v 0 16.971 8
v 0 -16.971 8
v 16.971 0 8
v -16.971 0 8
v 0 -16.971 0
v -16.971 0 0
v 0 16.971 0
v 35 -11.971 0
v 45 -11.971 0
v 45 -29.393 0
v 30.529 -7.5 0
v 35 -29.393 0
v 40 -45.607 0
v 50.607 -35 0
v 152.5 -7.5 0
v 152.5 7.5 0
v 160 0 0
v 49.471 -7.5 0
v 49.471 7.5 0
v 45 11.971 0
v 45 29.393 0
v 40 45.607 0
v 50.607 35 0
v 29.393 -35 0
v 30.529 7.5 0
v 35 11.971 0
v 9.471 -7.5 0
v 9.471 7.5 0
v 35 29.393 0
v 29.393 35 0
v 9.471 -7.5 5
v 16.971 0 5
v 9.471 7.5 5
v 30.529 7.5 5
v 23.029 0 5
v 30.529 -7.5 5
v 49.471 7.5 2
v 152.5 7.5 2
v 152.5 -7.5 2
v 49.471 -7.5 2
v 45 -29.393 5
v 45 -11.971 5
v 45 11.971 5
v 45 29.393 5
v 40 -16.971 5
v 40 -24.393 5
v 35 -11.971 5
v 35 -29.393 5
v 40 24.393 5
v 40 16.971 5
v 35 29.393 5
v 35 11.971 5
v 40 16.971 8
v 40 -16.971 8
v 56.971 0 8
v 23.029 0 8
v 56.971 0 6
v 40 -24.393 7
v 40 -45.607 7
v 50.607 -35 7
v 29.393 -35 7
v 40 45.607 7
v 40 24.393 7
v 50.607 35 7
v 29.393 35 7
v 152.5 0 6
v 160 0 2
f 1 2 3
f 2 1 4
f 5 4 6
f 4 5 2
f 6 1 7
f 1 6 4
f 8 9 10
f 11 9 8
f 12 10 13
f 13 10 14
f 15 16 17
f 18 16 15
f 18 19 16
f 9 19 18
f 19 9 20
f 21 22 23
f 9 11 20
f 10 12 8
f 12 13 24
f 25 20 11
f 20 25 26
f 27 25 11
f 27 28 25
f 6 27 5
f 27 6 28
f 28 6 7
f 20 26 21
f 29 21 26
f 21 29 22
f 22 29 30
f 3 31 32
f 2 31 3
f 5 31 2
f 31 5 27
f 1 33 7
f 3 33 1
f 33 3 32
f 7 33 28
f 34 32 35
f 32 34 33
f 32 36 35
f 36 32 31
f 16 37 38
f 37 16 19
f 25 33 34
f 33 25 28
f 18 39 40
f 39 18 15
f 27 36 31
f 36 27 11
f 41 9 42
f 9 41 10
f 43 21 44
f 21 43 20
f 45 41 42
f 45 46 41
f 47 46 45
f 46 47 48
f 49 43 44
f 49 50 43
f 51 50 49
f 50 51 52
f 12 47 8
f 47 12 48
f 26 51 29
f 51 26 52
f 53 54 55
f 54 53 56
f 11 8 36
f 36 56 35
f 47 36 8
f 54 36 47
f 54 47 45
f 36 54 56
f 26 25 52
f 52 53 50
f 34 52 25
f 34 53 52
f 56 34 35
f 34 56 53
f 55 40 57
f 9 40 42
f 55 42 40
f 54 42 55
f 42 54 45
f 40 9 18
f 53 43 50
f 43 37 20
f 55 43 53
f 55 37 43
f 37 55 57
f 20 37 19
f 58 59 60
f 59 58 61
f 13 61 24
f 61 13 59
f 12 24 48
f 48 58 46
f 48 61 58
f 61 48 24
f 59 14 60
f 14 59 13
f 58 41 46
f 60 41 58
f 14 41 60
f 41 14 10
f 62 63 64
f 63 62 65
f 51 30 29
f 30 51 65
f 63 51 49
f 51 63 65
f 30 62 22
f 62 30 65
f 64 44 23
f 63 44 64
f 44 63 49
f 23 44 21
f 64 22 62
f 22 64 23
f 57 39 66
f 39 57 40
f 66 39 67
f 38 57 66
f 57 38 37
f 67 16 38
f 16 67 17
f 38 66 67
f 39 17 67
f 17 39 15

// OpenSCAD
large_decoration_height = 8; //[0:30]
small_decoration_height = 7; //[0:30]
large_decoration_width = 24; //[10:40]
small_decoration_width = 15; //[7:35]
handle_width = 15; //[5:25]
hilt_width = 10; //[5:25]
hilt_length = 70; //[30:130]
handle_height = 5; //[0:30]
blade_length = 120; //[20:250]
blade_side_height = 2; //[0:30]
blade_center_height = 6; //[0:30]

// preview[view:south west, tilt:top diagonal]

//bottom
	rotate([0,0,45])
	translate([-large_decoration_width/2,-large_decoration_width/2,0])
	cube(size=[large_decoration_width,large_decoration_width,large_decoration_height]);

//handle
translate([0,-handle_width/2,0])
cube(size = [40,handle_width,handle_height]);

//hilt
translate([40 - hilt_width/2,-hilt_length/2,0])
cube(size = [hilt_width,hilt_length,handle_height]);

//where the two parts of the handle intersect
translate([40,0,0])
	rotate([0,0,45])
	translate([-large_decoration_width/2,-large_decoration_width/2,0])
	cube(size=[large_decoration_width,large_decoration_width,large_decoration_height]);

//right of hilt
translate([40,-hilt_length/2,0])
	rotate([0,0,45])
	translate([-small_decoration_width/2,-small_decoration_width/2,0])
	cube(size=[small_decoration_width,small_decoration_width,small_decoration_height]);

//left of hilt
translate([40,hilt_length/2,0])
	rotate([0,0,45])
	translate([-small_decoration_width/2,-small_decoration_width/2,0])
	cube(size=[small_decoration_width,small_decoration_width,small_decoration_height]);

//blade
translate([40,0,0])
polyhedron(
	points=[
			//bottom
			[0,-7.5,0], //0
			[blade_length-7.5,-7.5,0], //1
			[blade_length-7.5,7.5,0], //2
			[0,7.5,0], //3
			[blade_length,0,0], //4
			//middle
			[0,-7.5,blade_side_height], //5
			[blade_length-7.5,-7.5,blade_side_height], //6
			[blade_length-7.5,7.5,blade_side_height], //7
			[0,7.5,blade_side_height], //8
			[blade_length,0,blade_side_height], //9
			//top
			[0,0,blade_center_height], //10
			[blade_length-7.5,0,blade_center_height] //11
			],
	triangles=[
			//~-~bottom~-~
			[0,1,2],
			[0,2,3],
			//bottom point
			[1,4,2],
			//~-~walls~-~
			//right
			[0,5,1],
			[5,6,1],
			//right point
			[1,6,4],
			[4,6,9],
			//left
			[8,3,2],
			[7,8,2],
			//left point
			[7,2,4],
			[7,4,9],
			//back
			[0,3,5],
			[5,3,8],
			//~-~top~-~
			//right
			[10,6,5],
			[11,6,10],
			//right point
			[11,9,6],
			//left
			[10,8,7],
			[7,11,10],
			//left point
			[11,7,9],
			//back
			[10,5,8]
			]
	
);
